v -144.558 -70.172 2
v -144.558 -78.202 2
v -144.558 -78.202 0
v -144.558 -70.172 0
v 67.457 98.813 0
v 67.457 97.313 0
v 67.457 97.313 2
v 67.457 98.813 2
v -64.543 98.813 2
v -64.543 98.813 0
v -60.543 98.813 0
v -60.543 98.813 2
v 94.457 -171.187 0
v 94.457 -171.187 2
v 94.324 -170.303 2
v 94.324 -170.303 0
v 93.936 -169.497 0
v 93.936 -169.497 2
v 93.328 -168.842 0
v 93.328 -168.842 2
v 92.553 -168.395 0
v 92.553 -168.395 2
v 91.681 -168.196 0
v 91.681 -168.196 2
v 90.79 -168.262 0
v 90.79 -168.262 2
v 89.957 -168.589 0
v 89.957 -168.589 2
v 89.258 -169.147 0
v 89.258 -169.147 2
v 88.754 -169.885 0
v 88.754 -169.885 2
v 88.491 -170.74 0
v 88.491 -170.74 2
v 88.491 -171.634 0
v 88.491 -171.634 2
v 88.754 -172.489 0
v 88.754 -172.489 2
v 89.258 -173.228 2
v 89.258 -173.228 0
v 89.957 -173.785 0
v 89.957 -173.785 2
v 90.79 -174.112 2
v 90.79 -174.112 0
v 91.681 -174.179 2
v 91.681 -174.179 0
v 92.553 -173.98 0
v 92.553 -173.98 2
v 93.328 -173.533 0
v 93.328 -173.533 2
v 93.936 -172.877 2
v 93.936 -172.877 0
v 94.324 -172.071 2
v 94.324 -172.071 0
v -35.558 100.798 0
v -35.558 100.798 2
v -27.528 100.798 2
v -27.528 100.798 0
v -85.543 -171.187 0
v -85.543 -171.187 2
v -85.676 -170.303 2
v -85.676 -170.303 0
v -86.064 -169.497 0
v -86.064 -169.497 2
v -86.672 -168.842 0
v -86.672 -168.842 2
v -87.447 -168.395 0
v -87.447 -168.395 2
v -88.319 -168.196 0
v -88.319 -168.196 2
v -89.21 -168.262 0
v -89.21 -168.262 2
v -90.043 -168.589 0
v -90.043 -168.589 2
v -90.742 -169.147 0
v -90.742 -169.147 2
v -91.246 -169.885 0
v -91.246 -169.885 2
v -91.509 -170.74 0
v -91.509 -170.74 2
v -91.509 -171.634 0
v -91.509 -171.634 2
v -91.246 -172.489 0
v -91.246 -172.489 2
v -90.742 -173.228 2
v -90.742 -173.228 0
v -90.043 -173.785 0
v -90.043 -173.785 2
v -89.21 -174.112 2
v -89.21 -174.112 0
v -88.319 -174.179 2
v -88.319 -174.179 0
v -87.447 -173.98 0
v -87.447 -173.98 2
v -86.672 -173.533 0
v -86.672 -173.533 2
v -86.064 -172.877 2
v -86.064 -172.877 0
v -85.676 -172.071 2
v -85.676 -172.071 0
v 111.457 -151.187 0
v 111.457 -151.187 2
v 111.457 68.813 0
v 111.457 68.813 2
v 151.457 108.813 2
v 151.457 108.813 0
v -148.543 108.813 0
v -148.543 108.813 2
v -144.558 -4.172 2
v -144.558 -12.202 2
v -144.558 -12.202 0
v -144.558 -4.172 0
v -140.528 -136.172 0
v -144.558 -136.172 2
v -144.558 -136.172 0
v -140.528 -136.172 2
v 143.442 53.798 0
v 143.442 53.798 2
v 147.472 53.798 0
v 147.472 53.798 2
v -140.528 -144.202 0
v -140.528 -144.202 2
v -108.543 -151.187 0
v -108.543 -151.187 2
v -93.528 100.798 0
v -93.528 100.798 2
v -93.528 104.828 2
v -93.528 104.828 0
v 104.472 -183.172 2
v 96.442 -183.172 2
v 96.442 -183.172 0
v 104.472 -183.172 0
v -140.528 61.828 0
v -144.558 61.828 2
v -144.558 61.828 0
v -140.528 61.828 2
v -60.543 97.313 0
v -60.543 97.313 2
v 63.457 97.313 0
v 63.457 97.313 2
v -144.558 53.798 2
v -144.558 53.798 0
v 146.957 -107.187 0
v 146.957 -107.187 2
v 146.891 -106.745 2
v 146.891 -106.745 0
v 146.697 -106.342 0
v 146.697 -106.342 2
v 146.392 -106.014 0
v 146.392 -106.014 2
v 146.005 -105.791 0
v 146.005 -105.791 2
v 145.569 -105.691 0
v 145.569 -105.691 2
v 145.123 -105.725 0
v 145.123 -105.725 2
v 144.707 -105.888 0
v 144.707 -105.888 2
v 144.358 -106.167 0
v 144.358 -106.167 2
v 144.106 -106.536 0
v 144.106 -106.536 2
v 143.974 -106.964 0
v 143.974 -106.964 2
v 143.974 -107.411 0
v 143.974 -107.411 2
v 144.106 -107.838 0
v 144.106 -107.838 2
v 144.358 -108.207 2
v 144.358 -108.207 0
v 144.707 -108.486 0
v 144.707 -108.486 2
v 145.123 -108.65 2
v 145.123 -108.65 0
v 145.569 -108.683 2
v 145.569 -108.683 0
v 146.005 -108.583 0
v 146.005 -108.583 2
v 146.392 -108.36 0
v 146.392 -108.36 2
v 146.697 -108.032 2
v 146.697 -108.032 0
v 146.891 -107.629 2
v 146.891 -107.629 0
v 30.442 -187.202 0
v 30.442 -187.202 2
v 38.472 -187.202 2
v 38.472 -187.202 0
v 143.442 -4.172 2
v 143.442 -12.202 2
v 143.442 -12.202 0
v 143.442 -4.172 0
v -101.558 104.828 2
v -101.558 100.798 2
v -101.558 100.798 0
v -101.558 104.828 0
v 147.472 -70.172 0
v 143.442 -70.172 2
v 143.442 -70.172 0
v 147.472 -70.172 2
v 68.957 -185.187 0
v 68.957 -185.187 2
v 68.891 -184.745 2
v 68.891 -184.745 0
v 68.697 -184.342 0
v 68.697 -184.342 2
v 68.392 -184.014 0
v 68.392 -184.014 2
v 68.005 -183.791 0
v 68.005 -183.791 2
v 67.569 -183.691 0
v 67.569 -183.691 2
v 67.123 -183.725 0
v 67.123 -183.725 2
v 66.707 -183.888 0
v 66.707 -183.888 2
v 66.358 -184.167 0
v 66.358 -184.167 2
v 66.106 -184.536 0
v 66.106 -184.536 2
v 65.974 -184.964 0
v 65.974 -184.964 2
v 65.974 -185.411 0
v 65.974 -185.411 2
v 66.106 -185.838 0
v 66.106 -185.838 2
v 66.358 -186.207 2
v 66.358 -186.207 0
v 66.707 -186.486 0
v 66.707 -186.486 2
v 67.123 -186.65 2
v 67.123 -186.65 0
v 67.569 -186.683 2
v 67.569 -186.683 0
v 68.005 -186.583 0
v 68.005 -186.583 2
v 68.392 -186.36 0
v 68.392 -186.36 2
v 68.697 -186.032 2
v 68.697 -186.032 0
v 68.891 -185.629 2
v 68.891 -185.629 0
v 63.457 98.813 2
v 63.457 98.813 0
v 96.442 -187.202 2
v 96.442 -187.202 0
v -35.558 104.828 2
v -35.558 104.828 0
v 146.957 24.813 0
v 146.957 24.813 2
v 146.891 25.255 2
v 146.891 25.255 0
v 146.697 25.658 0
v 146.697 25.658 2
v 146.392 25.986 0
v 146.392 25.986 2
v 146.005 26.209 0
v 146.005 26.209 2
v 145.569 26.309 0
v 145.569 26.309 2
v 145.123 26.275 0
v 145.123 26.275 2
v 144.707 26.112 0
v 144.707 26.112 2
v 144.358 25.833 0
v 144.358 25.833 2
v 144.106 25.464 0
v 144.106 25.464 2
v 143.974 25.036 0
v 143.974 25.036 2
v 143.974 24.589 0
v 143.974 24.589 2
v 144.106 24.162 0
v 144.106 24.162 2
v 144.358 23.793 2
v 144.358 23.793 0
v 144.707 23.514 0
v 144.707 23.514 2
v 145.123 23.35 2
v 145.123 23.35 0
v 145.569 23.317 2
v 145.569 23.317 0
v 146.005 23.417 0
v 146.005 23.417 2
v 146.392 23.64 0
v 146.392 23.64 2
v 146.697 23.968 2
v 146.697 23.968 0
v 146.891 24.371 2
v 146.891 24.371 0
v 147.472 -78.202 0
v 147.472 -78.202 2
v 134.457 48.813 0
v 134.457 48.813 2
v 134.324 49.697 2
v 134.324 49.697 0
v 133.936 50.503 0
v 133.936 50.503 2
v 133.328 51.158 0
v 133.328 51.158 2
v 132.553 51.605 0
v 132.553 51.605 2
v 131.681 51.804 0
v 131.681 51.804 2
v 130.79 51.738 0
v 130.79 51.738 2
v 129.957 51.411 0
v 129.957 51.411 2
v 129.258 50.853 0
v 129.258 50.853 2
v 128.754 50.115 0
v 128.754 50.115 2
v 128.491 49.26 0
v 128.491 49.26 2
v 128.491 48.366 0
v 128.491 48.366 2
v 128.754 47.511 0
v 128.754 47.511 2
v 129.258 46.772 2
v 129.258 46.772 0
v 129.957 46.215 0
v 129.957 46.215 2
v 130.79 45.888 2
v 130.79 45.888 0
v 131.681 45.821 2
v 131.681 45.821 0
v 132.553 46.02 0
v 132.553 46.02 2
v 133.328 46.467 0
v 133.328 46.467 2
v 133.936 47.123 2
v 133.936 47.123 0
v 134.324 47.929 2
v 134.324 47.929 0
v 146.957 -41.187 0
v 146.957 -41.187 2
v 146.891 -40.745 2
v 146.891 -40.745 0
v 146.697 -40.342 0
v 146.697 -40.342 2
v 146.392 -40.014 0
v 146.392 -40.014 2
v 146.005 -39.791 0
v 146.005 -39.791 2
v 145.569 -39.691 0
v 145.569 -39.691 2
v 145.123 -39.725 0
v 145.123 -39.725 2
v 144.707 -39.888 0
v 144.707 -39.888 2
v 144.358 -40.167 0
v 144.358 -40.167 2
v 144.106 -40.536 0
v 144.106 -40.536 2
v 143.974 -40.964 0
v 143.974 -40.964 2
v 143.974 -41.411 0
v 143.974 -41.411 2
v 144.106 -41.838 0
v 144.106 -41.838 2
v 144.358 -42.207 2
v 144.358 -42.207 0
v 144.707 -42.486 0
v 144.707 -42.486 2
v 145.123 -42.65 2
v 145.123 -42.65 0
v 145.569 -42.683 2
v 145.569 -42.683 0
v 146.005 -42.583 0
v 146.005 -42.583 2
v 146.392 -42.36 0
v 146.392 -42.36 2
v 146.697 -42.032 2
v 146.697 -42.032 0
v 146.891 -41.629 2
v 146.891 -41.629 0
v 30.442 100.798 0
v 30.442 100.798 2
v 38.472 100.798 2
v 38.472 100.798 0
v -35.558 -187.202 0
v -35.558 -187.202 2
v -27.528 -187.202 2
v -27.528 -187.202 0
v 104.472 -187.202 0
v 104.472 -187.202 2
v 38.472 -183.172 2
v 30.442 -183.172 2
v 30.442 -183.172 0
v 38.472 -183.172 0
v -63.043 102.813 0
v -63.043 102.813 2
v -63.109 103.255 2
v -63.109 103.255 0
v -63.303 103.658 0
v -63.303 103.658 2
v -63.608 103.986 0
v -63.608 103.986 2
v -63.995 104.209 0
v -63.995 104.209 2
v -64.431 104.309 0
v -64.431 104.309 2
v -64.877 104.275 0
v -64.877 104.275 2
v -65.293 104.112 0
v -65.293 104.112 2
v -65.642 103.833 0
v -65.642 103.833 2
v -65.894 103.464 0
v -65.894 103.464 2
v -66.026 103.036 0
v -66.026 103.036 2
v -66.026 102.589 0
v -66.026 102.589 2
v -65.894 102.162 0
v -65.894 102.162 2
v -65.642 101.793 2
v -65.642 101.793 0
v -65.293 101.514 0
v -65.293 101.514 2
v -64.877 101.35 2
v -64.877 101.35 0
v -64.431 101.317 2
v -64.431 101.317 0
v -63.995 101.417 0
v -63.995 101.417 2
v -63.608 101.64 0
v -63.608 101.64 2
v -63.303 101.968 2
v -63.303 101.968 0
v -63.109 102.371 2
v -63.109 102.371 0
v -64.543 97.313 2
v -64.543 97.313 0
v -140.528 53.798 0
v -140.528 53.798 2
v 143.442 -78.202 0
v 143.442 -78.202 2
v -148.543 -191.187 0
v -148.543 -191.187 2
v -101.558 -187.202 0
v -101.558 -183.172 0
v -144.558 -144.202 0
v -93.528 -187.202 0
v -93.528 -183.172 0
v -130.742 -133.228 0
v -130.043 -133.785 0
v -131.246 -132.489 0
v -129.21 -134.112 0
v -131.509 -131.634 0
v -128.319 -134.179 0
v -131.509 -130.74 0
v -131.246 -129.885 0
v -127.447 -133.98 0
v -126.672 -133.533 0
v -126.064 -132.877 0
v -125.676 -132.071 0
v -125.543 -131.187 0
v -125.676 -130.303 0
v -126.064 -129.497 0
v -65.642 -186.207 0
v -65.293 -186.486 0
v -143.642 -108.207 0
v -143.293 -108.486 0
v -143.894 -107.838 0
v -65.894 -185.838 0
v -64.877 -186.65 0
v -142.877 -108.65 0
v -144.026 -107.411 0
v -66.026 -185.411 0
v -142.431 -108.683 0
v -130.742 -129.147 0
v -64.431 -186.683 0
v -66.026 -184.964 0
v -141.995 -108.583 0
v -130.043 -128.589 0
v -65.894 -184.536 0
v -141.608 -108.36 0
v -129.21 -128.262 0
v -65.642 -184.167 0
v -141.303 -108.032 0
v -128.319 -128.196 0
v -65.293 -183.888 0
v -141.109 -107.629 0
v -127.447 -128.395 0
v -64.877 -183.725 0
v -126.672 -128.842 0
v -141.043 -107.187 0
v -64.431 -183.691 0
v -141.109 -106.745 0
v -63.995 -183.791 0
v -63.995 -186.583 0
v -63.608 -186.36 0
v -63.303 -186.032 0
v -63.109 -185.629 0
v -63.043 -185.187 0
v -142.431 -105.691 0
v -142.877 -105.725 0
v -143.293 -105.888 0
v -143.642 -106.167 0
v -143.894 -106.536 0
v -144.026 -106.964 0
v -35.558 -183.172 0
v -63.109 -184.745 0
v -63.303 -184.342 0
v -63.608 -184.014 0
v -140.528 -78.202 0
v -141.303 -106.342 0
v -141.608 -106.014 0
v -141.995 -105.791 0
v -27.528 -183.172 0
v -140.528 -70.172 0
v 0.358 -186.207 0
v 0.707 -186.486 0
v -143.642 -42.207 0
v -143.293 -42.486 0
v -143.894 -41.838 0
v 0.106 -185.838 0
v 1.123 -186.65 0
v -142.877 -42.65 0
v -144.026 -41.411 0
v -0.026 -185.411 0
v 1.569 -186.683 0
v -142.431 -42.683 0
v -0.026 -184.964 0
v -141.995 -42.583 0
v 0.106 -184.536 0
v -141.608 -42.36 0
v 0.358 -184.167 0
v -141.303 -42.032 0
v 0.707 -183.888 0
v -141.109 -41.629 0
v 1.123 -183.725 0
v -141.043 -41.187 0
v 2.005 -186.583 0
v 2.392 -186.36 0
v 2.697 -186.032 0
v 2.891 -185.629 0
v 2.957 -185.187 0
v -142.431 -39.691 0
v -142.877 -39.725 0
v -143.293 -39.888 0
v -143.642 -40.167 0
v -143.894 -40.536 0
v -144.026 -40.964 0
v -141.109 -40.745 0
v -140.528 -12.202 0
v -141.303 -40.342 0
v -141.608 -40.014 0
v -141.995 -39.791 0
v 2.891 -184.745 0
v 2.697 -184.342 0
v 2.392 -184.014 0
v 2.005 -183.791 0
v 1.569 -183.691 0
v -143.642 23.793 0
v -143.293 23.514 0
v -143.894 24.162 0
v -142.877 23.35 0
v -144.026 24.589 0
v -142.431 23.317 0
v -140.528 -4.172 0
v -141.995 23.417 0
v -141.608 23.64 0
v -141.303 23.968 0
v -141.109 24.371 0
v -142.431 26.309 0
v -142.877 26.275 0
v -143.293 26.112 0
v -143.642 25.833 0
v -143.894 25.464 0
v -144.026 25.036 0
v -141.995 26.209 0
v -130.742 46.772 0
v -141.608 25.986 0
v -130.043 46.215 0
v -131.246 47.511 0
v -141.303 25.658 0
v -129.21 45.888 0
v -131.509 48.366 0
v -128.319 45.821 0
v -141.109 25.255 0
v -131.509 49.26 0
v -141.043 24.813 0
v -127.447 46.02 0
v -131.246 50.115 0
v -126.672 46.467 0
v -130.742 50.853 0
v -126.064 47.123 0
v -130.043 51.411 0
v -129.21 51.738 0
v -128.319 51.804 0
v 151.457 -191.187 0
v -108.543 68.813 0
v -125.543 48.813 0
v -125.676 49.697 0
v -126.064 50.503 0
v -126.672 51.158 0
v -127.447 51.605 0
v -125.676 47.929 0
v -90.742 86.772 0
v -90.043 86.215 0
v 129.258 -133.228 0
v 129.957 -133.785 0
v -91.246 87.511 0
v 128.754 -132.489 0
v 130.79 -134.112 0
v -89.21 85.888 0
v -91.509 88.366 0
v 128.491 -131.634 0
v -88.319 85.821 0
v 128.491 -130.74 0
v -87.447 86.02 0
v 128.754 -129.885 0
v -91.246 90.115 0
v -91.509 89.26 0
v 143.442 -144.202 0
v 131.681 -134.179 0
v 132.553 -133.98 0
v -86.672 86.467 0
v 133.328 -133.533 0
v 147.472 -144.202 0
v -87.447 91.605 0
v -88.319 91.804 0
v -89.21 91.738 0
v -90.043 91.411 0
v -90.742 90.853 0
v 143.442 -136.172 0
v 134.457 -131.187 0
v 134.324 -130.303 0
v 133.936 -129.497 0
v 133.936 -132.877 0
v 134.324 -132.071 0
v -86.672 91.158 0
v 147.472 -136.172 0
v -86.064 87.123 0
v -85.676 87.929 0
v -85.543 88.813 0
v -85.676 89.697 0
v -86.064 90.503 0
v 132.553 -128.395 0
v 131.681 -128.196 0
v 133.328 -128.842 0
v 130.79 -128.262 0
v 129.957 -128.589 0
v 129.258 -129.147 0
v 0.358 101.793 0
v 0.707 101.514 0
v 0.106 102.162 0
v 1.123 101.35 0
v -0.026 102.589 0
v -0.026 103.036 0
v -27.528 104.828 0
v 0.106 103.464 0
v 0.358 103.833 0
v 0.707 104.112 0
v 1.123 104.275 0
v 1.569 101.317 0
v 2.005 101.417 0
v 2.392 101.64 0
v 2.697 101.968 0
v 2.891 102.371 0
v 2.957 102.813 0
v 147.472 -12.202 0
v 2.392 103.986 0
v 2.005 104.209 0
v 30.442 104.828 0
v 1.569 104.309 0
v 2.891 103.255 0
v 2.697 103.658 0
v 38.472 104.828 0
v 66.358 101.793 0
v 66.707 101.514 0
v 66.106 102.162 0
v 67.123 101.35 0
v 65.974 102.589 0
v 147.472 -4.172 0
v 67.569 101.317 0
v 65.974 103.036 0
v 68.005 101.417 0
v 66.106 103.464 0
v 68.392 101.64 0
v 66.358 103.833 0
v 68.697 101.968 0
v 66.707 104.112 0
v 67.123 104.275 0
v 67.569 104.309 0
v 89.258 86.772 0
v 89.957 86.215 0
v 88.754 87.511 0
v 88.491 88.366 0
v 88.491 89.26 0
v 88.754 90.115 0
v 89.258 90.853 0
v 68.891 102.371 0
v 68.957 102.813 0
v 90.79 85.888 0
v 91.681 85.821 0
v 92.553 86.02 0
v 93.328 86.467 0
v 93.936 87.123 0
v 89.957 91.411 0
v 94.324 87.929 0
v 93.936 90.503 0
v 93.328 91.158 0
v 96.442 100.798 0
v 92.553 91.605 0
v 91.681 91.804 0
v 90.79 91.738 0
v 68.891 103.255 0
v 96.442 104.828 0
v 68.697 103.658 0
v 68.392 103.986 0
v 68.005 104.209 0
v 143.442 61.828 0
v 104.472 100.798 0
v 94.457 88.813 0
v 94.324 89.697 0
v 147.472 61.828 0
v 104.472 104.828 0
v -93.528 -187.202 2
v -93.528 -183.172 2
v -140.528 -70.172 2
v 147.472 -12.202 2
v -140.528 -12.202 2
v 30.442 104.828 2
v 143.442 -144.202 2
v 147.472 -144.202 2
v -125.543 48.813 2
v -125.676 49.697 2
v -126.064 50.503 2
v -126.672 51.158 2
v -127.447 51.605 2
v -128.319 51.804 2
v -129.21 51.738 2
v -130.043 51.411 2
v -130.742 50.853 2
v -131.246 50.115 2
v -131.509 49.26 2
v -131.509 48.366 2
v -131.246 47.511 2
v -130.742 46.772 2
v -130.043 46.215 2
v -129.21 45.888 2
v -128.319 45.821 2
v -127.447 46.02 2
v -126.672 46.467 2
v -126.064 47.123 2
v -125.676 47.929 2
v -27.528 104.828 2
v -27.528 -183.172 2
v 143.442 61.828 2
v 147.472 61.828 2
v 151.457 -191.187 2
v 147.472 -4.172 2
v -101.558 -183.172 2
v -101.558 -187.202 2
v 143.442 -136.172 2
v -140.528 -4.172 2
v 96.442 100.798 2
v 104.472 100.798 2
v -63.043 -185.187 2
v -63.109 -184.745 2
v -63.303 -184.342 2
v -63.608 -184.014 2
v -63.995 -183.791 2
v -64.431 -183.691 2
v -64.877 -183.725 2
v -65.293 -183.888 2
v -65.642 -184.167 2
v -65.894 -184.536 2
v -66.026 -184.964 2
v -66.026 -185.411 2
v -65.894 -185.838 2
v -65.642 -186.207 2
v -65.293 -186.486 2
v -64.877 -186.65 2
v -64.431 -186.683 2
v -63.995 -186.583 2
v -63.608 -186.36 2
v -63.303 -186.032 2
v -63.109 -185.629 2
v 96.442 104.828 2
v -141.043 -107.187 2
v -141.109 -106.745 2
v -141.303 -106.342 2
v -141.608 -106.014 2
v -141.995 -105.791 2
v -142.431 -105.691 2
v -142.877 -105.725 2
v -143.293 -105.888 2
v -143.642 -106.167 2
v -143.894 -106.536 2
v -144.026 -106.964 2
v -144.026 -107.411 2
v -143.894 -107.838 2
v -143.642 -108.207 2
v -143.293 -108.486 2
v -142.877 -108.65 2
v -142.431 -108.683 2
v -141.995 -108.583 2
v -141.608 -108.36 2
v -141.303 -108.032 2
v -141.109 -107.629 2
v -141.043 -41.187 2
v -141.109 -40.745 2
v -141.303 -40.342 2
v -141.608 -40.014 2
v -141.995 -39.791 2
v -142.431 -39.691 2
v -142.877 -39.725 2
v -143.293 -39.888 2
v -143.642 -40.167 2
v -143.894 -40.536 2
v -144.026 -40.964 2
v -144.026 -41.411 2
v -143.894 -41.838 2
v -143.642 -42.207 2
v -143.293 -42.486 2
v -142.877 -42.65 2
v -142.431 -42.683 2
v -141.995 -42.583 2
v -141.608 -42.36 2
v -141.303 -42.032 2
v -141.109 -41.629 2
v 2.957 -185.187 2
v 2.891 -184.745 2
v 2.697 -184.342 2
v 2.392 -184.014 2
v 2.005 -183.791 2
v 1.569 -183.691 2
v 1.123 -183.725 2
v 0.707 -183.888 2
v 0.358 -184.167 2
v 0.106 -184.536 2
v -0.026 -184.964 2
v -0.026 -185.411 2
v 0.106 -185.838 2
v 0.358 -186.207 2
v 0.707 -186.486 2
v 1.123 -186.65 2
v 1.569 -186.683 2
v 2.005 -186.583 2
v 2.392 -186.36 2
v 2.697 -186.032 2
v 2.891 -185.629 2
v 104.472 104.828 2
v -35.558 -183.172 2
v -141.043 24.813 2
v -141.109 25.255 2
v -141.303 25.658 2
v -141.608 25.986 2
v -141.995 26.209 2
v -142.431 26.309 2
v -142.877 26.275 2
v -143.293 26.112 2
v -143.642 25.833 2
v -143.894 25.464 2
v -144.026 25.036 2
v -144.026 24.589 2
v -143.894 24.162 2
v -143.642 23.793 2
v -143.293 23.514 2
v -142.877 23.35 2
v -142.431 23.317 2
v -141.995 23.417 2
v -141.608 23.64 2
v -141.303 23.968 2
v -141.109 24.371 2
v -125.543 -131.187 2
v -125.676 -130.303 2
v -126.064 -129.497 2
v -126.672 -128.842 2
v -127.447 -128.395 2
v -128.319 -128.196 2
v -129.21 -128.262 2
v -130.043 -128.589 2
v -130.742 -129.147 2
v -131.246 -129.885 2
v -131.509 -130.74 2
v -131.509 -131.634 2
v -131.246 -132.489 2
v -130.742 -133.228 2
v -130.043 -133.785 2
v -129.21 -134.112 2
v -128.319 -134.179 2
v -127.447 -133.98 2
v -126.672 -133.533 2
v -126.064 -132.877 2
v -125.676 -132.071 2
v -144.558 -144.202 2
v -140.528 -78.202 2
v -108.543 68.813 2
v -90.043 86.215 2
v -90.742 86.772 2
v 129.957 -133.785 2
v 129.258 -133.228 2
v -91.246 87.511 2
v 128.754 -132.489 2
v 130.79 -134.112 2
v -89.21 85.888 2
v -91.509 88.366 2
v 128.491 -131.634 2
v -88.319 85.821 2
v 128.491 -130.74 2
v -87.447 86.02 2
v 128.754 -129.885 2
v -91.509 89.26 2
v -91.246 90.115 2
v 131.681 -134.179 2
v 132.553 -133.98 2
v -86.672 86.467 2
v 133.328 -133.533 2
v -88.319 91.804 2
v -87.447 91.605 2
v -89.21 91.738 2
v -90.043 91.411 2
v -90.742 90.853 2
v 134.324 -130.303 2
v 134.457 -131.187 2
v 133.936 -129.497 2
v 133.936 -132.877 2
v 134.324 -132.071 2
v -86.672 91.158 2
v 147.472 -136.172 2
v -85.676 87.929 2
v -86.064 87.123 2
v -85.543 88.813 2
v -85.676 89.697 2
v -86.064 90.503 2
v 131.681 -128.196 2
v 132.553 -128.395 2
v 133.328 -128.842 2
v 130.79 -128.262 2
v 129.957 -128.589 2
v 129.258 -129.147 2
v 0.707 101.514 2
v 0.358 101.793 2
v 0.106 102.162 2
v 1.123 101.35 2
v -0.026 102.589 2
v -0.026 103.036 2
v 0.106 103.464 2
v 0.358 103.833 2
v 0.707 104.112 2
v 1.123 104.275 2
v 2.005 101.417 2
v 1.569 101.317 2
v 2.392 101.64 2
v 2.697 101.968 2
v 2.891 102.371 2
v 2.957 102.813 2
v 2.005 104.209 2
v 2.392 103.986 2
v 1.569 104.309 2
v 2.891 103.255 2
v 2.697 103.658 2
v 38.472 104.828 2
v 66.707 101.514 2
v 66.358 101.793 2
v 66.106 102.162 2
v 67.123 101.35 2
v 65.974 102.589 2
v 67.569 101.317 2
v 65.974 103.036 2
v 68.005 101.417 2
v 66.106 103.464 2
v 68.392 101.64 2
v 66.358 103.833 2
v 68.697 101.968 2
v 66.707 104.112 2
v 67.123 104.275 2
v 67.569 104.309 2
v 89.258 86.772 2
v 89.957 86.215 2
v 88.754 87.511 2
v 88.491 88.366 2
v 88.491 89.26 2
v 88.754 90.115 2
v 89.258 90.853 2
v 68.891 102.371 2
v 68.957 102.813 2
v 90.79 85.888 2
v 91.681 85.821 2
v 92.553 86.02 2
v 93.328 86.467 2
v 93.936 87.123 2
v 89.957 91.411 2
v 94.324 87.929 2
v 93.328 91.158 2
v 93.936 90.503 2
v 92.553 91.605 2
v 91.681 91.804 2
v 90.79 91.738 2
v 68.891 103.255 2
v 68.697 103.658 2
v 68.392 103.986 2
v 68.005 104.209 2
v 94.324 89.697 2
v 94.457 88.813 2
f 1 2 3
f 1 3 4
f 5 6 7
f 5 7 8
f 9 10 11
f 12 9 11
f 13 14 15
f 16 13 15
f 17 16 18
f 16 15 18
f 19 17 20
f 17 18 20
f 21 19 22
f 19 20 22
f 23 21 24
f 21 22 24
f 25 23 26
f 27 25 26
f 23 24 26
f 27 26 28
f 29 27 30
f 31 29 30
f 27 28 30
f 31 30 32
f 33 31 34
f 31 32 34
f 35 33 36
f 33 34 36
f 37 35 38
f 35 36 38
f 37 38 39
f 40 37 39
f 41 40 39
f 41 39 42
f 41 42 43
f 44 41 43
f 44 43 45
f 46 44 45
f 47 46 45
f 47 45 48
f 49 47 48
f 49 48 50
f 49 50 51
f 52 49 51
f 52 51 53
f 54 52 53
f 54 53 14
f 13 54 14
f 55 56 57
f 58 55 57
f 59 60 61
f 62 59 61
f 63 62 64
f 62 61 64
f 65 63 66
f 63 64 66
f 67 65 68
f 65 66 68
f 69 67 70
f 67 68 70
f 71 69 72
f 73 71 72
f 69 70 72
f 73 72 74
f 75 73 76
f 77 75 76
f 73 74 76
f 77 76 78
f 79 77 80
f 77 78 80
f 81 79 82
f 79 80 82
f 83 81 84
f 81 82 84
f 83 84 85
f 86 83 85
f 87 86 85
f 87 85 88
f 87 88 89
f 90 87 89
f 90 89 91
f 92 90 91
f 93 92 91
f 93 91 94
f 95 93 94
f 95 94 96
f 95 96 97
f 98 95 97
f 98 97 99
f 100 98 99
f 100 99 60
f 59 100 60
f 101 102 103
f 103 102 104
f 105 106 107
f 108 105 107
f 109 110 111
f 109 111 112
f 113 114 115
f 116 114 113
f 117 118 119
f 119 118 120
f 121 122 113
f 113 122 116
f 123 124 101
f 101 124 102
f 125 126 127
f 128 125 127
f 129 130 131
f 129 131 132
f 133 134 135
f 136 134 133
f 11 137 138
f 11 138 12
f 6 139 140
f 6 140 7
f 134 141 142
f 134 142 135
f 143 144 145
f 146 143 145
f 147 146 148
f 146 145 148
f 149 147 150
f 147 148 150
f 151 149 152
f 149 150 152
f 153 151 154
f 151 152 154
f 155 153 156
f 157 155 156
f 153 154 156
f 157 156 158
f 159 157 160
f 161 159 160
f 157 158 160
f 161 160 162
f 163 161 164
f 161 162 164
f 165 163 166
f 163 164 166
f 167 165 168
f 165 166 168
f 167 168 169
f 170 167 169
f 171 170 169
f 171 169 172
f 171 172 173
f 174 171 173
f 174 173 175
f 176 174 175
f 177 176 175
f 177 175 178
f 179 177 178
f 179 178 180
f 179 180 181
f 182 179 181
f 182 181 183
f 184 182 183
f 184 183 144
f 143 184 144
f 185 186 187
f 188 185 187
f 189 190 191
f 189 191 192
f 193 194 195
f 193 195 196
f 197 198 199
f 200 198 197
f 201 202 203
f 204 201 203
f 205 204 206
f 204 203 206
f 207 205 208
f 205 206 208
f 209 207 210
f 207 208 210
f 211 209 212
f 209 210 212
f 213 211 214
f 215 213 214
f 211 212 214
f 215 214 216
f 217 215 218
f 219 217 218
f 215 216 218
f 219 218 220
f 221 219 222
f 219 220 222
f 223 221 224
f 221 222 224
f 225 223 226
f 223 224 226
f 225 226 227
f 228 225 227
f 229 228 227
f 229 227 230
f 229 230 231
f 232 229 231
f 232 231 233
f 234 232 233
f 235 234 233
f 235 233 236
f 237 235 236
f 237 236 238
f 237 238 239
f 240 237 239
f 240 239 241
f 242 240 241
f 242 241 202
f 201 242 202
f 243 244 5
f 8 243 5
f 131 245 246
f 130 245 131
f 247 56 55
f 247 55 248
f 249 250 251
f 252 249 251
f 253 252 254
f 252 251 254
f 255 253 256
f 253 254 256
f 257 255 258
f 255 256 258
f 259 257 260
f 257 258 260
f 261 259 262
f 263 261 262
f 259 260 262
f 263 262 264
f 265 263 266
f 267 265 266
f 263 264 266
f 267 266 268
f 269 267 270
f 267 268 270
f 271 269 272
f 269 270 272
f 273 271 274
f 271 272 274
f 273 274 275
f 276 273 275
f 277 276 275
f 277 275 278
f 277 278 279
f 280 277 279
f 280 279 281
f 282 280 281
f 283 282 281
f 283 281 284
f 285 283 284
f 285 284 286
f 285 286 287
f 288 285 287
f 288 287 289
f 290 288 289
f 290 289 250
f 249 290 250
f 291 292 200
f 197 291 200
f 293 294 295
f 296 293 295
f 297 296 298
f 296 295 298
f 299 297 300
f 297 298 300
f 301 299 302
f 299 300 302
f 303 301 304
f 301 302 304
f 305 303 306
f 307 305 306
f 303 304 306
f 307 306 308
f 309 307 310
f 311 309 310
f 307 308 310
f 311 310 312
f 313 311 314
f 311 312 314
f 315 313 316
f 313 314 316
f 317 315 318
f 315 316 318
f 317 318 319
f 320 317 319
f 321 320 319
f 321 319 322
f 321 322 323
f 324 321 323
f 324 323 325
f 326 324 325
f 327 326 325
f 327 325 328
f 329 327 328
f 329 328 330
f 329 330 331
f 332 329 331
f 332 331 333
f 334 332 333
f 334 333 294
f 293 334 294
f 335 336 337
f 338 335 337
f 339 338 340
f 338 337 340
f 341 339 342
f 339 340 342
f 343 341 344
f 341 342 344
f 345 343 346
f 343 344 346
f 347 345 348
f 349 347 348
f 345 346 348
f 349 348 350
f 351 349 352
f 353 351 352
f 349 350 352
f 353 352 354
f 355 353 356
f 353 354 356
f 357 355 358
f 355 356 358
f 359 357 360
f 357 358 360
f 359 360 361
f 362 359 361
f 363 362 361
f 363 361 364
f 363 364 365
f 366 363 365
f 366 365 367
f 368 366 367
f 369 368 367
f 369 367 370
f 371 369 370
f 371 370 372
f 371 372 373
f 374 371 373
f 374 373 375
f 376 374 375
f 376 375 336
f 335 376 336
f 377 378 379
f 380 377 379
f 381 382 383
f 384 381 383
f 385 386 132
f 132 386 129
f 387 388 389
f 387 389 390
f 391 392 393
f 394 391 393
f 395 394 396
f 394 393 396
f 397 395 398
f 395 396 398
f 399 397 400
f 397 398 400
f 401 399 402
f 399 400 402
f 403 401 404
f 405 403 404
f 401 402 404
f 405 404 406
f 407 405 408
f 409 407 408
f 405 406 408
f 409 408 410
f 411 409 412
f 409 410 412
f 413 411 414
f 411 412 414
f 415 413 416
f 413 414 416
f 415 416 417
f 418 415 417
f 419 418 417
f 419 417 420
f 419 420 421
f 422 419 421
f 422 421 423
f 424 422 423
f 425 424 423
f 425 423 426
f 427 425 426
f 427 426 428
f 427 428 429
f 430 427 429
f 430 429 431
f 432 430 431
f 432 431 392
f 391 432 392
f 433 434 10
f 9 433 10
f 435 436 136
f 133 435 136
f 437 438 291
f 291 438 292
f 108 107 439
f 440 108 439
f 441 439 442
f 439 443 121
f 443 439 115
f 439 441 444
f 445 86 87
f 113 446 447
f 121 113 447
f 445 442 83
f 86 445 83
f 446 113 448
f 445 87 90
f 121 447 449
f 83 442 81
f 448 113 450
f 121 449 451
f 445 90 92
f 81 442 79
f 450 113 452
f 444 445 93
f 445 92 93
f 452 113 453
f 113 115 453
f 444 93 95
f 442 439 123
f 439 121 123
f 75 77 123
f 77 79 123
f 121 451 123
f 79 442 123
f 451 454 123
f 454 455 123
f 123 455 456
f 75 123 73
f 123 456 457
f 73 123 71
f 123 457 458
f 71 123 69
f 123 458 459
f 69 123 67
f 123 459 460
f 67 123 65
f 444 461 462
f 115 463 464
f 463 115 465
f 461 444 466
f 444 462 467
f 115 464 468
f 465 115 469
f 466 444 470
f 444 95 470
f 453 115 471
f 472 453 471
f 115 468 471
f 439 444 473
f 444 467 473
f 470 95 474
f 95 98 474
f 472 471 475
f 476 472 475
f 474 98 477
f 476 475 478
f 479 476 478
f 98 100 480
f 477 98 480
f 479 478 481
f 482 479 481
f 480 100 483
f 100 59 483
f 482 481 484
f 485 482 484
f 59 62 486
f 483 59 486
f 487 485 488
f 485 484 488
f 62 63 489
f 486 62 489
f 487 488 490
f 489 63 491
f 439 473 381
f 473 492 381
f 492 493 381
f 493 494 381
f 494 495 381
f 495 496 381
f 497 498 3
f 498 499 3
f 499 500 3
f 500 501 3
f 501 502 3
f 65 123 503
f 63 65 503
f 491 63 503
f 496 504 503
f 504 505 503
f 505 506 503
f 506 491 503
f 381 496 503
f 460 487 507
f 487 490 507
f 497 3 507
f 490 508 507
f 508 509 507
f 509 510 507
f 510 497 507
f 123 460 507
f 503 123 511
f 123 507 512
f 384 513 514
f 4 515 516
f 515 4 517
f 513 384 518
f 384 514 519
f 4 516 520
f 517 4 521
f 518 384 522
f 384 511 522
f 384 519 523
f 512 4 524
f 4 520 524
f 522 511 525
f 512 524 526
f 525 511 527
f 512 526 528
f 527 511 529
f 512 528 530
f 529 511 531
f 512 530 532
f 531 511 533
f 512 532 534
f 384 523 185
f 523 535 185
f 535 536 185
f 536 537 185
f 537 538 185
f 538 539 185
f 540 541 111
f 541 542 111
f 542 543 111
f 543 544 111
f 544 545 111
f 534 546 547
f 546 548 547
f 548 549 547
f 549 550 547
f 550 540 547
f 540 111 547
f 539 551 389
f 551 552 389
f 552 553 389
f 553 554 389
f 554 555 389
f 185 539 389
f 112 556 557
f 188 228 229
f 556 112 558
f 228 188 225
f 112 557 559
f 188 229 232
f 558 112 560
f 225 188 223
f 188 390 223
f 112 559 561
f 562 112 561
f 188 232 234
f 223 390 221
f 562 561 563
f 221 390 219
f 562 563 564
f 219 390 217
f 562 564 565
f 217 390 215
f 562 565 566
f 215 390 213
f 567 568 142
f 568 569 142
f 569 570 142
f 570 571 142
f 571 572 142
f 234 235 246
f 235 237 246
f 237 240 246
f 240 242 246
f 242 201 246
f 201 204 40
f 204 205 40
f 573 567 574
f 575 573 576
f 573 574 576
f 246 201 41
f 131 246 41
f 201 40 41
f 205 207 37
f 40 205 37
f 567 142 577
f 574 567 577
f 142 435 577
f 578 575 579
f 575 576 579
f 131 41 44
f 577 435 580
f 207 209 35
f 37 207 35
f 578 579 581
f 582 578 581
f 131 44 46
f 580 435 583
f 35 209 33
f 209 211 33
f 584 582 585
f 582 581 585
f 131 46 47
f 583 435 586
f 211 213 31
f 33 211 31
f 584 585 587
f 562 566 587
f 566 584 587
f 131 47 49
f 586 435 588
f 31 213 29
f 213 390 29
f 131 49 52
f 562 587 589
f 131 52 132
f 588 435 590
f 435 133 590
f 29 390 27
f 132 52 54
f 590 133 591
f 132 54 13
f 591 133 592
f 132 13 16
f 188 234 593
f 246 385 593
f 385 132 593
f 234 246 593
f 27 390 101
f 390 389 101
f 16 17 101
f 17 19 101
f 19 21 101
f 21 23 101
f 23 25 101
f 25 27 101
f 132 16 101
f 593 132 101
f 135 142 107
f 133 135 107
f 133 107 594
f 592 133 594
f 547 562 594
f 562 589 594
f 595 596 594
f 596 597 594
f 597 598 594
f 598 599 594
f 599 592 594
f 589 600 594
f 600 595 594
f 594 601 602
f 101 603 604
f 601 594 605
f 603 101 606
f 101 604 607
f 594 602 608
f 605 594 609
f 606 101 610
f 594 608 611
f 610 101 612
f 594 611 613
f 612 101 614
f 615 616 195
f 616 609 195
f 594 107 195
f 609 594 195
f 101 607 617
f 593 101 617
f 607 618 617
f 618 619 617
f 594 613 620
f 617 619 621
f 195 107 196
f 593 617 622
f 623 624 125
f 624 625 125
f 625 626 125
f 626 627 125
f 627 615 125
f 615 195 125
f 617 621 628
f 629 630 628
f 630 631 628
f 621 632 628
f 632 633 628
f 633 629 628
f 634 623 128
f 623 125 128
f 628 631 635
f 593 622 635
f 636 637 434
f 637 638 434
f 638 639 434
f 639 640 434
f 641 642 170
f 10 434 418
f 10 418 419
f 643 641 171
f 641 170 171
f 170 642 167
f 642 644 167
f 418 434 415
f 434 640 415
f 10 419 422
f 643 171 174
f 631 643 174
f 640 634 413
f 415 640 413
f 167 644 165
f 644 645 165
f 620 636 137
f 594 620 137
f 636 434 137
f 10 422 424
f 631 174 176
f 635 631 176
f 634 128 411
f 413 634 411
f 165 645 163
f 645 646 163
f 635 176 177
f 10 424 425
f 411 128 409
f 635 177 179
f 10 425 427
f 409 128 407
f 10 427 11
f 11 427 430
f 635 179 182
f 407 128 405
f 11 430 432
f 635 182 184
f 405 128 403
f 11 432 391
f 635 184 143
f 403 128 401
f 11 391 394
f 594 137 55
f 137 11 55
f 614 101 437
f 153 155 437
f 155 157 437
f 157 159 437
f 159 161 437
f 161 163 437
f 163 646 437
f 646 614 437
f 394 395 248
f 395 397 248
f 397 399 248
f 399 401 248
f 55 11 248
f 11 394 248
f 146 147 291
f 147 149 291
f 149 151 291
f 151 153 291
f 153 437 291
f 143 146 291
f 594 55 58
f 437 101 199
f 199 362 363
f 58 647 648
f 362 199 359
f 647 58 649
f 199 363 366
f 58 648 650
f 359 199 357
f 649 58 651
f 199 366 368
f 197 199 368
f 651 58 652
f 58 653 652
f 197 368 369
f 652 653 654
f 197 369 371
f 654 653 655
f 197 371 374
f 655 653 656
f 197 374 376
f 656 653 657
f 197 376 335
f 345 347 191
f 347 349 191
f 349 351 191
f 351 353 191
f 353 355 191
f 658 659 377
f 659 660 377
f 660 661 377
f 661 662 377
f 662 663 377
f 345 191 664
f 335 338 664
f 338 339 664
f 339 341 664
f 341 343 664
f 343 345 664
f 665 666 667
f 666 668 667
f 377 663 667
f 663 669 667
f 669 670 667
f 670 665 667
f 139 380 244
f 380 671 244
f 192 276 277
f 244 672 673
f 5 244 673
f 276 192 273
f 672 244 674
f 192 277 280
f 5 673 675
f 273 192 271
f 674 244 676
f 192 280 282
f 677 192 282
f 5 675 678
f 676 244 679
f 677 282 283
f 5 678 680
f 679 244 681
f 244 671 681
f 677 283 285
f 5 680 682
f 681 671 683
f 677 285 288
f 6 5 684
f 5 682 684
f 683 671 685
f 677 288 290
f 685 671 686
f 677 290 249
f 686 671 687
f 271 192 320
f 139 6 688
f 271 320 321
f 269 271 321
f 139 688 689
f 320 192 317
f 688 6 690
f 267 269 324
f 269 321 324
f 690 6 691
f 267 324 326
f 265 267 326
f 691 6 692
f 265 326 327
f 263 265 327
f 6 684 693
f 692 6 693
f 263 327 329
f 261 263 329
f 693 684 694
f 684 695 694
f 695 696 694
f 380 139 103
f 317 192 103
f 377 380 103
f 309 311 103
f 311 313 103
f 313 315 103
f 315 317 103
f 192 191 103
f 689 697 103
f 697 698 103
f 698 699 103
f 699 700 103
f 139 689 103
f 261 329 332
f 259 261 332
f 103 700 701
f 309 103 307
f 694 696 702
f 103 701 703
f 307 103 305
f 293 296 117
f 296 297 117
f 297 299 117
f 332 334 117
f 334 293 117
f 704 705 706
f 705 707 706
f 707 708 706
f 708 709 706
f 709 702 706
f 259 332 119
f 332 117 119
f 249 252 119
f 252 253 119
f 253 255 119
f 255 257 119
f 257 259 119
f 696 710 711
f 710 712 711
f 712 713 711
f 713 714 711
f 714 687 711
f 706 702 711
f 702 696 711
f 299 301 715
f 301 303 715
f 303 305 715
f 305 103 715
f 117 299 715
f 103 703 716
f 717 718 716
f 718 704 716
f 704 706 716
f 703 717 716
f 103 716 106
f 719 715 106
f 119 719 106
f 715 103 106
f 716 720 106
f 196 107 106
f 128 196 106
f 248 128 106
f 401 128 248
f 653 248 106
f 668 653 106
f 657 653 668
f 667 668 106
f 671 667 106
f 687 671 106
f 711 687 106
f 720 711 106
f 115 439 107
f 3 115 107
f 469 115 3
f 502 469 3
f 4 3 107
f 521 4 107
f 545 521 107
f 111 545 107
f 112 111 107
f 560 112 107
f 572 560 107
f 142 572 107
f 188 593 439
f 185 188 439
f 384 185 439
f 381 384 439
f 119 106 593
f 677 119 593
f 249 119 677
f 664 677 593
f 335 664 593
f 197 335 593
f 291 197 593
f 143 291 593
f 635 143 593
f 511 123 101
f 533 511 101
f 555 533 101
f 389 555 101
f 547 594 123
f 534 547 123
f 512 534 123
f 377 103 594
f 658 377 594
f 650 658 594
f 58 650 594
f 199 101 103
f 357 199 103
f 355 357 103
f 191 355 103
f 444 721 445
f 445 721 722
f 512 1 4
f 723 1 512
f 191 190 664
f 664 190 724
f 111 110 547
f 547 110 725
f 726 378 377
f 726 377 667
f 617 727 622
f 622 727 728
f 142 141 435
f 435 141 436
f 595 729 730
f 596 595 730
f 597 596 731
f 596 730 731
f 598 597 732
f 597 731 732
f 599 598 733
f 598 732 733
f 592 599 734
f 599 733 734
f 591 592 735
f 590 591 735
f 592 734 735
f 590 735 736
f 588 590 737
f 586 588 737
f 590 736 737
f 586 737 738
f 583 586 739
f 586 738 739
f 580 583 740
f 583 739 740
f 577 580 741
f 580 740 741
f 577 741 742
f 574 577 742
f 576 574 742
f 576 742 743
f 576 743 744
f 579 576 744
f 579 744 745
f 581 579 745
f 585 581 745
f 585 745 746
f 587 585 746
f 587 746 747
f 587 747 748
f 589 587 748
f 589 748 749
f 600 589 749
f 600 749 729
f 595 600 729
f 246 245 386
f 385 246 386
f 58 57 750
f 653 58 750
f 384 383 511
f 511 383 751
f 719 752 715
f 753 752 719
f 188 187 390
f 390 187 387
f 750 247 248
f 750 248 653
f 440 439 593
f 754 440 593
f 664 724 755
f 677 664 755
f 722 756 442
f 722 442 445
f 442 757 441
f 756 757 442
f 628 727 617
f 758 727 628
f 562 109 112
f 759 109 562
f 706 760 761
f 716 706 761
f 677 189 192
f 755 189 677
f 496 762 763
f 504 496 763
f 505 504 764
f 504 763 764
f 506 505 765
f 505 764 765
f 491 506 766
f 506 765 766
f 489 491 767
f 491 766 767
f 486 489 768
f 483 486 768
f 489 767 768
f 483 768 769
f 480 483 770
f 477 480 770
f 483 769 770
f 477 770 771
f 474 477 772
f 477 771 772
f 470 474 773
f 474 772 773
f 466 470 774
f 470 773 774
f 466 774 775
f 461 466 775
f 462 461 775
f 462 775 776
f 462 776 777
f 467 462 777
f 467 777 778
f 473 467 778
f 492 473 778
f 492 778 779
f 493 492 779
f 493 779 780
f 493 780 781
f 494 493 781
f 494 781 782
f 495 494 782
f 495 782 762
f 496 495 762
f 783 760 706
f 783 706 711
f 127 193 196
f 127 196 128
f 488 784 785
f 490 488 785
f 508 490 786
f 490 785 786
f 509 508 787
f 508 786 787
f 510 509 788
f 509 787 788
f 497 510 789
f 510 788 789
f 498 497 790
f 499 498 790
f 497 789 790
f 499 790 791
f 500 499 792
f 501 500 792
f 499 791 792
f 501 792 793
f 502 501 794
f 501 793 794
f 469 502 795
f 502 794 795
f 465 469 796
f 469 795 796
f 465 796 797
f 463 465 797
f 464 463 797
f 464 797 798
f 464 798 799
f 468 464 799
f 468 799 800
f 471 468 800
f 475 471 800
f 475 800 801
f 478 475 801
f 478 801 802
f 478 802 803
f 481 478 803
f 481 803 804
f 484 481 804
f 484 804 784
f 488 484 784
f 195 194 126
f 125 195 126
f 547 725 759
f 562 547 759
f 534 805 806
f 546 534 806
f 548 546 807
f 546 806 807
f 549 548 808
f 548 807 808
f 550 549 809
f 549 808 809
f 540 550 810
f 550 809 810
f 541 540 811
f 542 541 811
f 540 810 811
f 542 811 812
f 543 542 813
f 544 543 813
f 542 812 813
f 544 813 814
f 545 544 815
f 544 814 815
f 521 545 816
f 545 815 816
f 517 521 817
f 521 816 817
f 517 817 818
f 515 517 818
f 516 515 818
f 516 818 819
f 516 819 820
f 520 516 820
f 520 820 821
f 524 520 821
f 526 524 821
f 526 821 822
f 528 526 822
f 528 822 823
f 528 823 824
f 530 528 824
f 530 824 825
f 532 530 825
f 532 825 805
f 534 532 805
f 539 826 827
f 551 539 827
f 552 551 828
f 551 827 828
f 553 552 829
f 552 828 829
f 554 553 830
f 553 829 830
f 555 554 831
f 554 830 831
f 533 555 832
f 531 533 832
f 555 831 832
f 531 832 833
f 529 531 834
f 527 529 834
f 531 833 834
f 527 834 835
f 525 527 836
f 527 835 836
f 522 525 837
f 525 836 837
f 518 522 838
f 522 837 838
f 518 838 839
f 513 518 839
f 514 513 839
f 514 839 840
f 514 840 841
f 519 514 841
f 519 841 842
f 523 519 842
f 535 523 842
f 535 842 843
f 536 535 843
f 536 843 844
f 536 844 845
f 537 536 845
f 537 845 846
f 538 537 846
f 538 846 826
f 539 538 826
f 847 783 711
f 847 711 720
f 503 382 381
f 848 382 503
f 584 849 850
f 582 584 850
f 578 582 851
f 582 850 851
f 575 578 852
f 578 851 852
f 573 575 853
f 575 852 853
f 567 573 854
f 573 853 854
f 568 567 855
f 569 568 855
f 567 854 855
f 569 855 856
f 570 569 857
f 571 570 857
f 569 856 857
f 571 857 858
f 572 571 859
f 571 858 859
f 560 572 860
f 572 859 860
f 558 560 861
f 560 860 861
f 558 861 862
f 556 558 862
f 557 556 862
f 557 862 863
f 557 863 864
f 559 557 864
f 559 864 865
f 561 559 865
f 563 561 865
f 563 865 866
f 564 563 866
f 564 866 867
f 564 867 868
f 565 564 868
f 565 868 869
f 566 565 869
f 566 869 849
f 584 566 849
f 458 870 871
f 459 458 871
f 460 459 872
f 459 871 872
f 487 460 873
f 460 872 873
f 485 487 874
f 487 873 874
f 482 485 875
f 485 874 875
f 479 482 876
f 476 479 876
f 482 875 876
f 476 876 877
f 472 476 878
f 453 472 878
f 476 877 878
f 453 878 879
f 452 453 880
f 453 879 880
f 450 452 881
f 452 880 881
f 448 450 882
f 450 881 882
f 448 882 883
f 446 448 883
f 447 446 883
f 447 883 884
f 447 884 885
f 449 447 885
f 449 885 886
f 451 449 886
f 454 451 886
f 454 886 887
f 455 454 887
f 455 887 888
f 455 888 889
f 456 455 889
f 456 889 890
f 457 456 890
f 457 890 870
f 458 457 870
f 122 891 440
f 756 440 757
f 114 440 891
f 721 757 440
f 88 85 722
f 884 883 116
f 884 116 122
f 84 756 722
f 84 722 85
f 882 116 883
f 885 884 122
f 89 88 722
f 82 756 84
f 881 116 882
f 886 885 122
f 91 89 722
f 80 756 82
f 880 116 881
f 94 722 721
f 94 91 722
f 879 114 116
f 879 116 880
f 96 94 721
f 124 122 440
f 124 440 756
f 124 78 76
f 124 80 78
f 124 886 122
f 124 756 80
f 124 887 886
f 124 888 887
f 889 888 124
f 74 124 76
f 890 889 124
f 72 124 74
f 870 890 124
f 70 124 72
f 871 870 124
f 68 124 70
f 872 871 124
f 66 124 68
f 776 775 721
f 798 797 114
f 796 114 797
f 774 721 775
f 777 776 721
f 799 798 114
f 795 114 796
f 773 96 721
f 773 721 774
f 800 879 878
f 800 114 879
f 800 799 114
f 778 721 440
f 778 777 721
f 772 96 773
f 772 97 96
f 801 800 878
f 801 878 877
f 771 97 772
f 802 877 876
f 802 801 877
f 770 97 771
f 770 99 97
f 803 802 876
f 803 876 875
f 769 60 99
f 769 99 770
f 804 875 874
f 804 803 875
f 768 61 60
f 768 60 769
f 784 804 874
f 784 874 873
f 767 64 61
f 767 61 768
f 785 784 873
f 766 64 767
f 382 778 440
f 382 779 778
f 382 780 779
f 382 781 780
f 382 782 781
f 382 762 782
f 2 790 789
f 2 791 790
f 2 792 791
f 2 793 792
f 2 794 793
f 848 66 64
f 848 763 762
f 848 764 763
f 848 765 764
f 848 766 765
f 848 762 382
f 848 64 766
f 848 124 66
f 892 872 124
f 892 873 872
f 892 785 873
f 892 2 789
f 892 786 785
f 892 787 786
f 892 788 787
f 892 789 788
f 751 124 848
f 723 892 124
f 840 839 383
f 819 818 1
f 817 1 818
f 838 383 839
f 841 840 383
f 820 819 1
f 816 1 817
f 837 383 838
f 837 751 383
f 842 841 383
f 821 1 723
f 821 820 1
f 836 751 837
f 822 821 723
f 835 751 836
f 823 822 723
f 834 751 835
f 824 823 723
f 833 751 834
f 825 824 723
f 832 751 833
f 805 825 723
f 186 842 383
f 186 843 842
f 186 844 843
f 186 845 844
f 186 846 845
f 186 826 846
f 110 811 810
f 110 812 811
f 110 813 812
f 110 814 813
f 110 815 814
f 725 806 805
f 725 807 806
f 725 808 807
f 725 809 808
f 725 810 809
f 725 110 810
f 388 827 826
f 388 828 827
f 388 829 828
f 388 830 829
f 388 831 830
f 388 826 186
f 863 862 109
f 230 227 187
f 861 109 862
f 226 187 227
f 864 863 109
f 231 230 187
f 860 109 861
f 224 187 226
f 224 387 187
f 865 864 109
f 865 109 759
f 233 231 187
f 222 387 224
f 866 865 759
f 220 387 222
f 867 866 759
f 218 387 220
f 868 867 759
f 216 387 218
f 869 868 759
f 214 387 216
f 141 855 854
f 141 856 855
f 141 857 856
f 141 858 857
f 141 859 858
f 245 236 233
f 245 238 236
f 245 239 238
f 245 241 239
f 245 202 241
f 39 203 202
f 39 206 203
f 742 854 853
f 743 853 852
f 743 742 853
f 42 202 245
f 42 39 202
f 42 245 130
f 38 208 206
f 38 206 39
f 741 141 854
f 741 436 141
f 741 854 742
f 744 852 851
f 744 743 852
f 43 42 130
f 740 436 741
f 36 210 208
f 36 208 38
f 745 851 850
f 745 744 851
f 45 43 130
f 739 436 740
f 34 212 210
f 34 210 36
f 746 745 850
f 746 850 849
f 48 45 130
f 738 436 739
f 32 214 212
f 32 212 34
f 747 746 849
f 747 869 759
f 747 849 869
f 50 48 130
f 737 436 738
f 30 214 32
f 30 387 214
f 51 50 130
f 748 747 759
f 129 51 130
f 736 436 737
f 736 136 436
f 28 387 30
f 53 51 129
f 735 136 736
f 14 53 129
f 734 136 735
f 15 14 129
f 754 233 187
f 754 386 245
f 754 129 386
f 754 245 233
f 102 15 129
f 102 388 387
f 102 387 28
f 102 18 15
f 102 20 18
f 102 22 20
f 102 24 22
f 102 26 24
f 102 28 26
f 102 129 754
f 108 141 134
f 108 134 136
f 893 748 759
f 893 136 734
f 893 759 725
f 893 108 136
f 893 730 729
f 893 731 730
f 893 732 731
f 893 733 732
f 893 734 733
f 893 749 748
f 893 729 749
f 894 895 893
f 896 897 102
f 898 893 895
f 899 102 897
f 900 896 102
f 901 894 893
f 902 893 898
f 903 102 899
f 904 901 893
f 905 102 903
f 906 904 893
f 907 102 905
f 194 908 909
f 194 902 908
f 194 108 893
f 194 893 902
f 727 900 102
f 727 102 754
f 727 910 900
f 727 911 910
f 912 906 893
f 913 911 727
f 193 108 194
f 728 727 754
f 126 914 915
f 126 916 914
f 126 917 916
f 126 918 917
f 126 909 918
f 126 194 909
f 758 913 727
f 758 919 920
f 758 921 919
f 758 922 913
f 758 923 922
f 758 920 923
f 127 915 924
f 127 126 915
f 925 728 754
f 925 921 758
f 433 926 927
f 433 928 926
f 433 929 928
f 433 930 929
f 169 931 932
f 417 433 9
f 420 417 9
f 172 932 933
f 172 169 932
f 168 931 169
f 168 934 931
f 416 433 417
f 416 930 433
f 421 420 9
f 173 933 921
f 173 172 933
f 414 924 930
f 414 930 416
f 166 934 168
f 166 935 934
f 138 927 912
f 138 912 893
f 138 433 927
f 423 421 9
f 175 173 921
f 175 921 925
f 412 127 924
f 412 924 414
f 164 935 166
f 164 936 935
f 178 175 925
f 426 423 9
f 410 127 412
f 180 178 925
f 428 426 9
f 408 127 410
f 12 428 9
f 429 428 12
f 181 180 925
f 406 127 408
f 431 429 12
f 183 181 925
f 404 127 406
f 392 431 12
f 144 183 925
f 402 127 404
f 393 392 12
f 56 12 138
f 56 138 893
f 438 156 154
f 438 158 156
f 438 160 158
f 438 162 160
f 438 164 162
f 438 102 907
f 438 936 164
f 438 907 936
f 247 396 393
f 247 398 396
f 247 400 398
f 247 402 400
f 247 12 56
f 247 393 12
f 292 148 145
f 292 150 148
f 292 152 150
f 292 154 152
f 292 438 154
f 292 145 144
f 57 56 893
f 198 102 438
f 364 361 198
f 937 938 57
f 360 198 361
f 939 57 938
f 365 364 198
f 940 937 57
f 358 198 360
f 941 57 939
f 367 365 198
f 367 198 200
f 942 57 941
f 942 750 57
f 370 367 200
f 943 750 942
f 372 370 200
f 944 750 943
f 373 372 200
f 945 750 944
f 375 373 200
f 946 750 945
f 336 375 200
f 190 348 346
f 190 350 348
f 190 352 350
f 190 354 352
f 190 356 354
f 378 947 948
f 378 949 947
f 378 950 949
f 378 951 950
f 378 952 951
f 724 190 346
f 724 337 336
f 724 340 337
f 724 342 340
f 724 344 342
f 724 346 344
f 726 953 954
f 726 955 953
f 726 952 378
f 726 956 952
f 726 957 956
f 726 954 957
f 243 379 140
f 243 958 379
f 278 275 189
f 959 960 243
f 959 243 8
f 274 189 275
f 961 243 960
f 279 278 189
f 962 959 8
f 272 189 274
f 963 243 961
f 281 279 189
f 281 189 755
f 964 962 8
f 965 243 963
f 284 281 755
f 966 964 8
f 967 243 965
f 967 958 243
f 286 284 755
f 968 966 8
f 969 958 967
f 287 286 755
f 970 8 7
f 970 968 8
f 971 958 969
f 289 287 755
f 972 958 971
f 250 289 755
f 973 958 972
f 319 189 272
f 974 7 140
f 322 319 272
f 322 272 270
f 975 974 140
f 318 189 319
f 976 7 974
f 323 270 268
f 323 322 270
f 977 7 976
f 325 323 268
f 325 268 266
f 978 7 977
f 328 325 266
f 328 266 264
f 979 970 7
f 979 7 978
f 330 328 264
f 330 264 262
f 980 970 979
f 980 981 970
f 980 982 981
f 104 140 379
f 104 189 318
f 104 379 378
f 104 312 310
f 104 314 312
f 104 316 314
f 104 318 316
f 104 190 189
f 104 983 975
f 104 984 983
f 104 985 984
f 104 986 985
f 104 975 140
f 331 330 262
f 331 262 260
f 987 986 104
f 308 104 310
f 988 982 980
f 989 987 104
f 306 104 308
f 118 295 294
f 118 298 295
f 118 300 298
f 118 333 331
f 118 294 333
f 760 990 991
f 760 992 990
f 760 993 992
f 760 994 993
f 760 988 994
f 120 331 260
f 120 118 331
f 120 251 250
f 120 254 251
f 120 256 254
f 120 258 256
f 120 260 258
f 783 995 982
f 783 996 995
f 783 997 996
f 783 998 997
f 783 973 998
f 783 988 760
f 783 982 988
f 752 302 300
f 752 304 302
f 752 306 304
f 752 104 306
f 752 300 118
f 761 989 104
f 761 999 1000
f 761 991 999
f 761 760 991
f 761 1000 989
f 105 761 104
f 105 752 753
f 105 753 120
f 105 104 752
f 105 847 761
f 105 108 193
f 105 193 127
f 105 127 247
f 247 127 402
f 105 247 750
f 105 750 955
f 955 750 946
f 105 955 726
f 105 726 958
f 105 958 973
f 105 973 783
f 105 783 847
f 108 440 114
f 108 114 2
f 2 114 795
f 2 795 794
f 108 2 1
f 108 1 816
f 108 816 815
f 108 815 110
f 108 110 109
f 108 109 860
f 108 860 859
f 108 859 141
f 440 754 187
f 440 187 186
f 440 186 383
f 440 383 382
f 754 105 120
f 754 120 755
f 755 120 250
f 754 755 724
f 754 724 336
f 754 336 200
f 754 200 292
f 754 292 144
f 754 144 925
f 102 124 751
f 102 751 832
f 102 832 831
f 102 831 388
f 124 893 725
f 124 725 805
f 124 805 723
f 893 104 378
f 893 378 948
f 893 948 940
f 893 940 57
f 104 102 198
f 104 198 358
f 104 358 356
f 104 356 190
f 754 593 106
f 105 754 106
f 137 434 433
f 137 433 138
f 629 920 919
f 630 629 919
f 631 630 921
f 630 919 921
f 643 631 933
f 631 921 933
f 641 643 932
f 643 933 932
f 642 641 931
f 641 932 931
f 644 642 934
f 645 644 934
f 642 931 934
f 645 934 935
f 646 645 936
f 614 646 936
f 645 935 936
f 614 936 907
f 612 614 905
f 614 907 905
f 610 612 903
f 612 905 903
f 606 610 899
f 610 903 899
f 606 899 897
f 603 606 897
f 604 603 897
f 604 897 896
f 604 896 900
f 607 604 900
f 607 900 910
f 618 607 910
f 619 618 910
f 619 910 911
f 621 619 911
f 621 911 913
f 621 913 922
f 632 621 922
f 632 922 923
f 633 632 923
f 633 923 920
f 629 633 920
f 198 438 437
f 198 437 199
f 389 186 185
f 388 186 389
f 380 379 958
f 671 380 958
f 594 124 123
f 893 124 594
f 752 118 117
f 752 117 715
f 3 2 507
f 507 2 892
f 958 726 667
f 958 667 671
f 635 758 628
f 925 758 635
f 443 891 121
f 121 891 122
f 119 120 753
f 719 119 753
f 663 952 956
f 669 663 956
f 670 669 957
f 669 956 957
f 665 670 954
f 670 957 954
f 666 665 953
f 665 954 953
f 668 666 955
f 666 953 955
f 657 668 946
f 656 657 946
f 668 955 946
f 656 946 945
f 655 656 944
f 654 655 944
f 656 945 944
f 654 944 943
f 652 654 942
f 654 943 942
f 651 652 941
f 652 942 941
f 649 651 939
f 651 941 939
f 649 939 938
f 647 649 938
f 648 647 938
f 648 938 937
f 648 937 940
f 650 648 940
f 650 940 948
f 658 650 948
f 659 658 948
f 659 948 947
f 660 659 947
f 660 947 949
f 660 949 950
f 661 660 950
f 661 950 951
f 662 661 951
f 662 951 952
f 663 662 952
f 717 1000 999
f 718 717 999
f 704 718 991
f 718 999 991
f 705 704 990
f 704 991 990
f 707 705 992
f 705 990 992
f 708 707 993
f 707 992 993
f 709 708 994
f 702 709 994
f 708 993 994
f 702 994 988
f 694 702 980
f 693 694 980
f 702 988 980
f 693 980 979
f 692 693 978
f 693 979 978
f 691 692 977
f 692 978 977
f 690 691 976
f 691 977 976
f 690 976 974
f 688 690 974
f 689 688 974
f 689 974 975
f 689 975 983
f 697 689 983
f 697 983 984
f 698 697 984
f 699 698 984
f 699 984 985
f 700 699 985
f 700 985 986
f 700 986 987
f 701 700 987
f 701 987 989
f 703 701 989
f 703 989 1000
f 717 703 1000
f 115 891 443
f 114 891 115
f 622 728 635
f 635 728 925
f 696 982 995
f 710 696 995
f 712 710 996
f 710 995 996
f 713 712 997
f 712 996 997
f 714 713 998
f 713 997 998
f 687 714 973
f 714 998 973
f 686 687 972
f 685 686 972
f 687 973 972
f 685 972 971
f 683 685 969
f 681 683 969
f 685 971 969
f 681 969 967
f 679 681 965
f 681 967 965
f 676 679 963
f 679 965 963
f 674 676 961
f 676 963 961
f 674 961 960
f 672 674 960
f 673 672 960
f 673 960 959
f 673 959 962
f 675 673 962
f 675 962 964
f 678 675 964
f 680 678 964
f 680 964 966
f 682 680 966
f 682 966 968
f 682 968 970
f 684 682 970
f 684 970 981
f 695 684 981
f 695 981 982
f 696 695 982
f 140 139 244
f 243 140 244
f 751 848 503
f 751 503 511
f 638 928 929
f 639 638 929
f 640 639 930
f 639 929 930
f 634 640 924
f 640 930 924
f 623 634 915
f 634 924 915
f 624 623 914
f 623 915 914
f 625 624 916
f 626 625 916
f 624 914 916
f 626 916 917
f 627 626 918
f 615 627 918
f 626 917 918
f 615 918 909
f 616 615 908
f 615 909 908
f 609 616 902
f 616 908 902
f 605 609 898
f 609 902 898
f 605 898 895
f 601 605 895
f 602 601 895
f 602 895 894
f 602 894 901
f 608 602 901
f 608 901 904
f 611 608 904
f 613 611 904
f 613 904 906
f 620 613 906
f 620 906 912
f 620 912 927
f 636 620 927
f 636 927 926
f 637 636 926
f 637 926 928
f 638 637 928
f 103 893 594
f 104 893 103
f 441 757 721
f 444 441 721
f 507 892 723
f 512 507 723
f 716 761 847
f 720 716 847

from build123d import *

# Parameters (mm, degrees)
SKETCH_1_W          = 4
SKETCH_1_H          = 1.5
EXTRUDE_1_DEPTH     = 2
SKETCH_3_R          = 1.5
SKETCH_3_R_2        = 1.65
SKETCH_3_W          = 8.03
SKETCH_3_H          = 4.03
SKETCH_3_W_2        = 4.03
SKETCH_3_H_2        = 8.03
CUT_EXTRUDE_2_DEPTH = 4
SKETCH_7_R          = 3
CUT_EXTRUDE_3_DEPTH = 10
SKETCH_8_W          = 220
SKETCH_8_H          = 220
CUT_EXTRUDE_4_DEPTH = 4


with BuildPart() as part:
    # 草图1 → 凸台-拉伸1 (new body)
    with BuildSketch(Plane.XY):
        Polygon((151.457142857, -41.187142857), (151.457142857, 108.812857143), (-148.542857143, 108.812857143), (-148.542857143, -191.187142857), (151.457142857, -191.187142857), align=None)
        with Locations((65.457142857, 98.062857143)):
            Rectangle(SKETCH_1_W, SKETCH_1_H, mode=Mode.SUBTRACT)
        with Locations((-62.542857143, 98.062857143)):
            Rectangle(SKETCH_1_W, SKETCH_1_H, mode=Mode.SUBTRACT)
    extrude(amount=EXTRUDE_1_DEPTH)

    # 草图3 → 切除-拉伸2 (cut)
    with BuildSketch(Plane.XY.offset(2)):
        with Locations((1.457142857, -185.187142857)):
            Circle(SKETCH_3_R)
        with Locations((67.457142857, -185.187142857)):
            Circle(SKETCH_3_R)
        with Locations((-64.542857143, -185.187142857)):
            Circle(SKETCH_3_R)
        with Locations((-142.542857143, 24.812857143)):
            Circle(SKETCH_3_R)
        with Locations((-142.542857143, -41.187142857)):
            Circle(SKETCH_3_R)
        with Locations((-142.542857143, -107.187142857)):
            Circle(SKETCH_3_R)
        with Locations((67.457142857, 102.812857143)):
            Circle(SKETCH_3_R)
        with Locations((1.457142857, 102.812857143)):
            Circle(SKETCH_3_R)
        with Locations((-64.542857143, 102.812857143)):
            Circle(SKETCH_3_R)
        with Locations((145.457142857, -107.187142857)):
            Circle(SKETCH_3_R)
        with Locations((145.457142857, -41.187142857)):
            Circle(SKETCH_3_R)
        with Locations((145.457142857, 24.812857143)):
            Circle(SKETCH_3_R)
        with Locations((1.457142857, -108.687142857)):
            Circle(SKETCH_3_R_2)
        with Locations((-46.272564873, -88.916850587)):
            Circle(SKETCH_3_R_2)
        with Locations((-66.042857143, -41.187142857)):
            Circle(SKETCH_3_R_2)
        with Locations((-46.272564873, 6.542564873)):
            Circle(SKETCH_3_R_2)
        with Locations((1.457142857, 26.312857143)):
            Circle(SKETCH_3_R_2)
        with Locations((49.186850587, 6.542564873)):
            Circle(SKETCH_3_R_2)
        with Locations((68.957142857, -41.187142857)):
            Circle(SKETCH_3_R_2)
        with Locations((49.186850587, -88.916850587)):
            Circle(SKETCH_3_R_2)
        with Locations((1.457142857, -125.187142857)):
            Circle(SKETCH_3_R)
        with Locations((100.457142857, -185.187142857)):
            Rectangle(SKETCH_3_W, SKETCH_3_H)
        with Locations((34.457142857, -185.187142857)):
            Rectangle(SKETCH_3_W, SKETCH_3_H)
        with Locations((-31.542857143, -185.187142857)):
            Rectangle(SKETCH_3_W, SKETCH_3_H)
        with Locations((-97.542857143, -185.187142857)):
            Rectangle(SKETCH_3_W, SKETCH_3_H)
        with Locations((-142.542857143, 57.812857143)):
            Rectangle(SKETCH_3_W_2, SKETCH_3_H_2)
        with Locations((-142.542857143, -8.187142857)):
            Rectangle(SKETCH_3_W_2, SKETCH_3_H_2)
        with Locations((-142.542857143, -74.187142857)):
            Rectangle(SKETCH_3_W_2, SKETCH_3_H_2)
        with Locations((-142.542857143, -140.187142857)):
            Rectangle(SKETCH_3_W_2, SKETCH_3_H_2)
        with Locations((100.457142857, 102.812857143)):
            Rectangle(SKETCH_3_W, SKETCH_3_H)
        with Locations((34.457142857, 102.812857143)):
            Rectangle(SKETCH_3_W, SKETCH_3_H)
        with Locations((-31.542857143, 102.812857143)):
            Rectangle(SKETCH_3_W, SKETCH_3_H)
        with Locations((-97.542857143, 102.812857143)):
            Rectangle(SKETCH_3_W, SKETCH_3_H)
        with Locations((145.457142857, -140.187142857)):
            Rectangle(SKETCH_3_W_2, SKETCH_3_H_2)
        with Locations((145.457142857, -74.187142857)):
            Rectangle(SKETCH_3_W_2, SKETCH_3_H_2)
        with Locations((145.457142857, -8.187142857)):
            Rectangle(SKETCH_3_W_2, SKETCH_3_H_2)
        with Locations((145.457142857, 57.812857143)):
            Rectangle(SKETCH_3_W_2, SKETCH_3_H_2)
    extrude(amount=-CUT_EXTRUDE_2_DEPTH, mode=Mode.SUBTRACT)

    # 草图7 → 切除-拉伸3 (cut)
    with BuildSketch(Plane.XY.offset(2)):
        with Locations((-88.542857143, -171.187142857)):
            Circle(SKETCH_7_R)
        with Locations((91.457142857, -171.187142857)):
            Circle(SKETCH_7_R)
        with Locations((-128.542857143, 48.812857143)):
            Circle(SKETCH_7_R)
        with Locations((-128.542857143, -131.187142857)):
            Circle(SKETCH_7_R)
        with Locations((91.457142857, 88.812857143)):
            Circle(SKETCH_7_R)
        with Locations((-88.542857143, 88.812857143)):
            Circle(SKETCH_7_R)
        with Locations((131.457142857, -131.187142857)):
            Circle(SKETCH_7_R)
        with Locations((131.457142857, 48.812857143)):
            Circle(SKETCH_7_R)
    extrude(amount=-CUT_EXTRUDE_3_DEPTH, mode=Mode.SUBTRACT)

    # 草图8 → 切除-拉伸4 (cut)
    with BuildSketch(Plane.XY.offset(2)):
        with Locations((1.457142857, -41.187142857)):
            Rectangle(SKETCH_8_W, SKETCH_8_H)
    extrude(amount=-CUT_EXTRUDE_4_DEPTH, mode=Mode.SUBTRACT)


solid = part.part
